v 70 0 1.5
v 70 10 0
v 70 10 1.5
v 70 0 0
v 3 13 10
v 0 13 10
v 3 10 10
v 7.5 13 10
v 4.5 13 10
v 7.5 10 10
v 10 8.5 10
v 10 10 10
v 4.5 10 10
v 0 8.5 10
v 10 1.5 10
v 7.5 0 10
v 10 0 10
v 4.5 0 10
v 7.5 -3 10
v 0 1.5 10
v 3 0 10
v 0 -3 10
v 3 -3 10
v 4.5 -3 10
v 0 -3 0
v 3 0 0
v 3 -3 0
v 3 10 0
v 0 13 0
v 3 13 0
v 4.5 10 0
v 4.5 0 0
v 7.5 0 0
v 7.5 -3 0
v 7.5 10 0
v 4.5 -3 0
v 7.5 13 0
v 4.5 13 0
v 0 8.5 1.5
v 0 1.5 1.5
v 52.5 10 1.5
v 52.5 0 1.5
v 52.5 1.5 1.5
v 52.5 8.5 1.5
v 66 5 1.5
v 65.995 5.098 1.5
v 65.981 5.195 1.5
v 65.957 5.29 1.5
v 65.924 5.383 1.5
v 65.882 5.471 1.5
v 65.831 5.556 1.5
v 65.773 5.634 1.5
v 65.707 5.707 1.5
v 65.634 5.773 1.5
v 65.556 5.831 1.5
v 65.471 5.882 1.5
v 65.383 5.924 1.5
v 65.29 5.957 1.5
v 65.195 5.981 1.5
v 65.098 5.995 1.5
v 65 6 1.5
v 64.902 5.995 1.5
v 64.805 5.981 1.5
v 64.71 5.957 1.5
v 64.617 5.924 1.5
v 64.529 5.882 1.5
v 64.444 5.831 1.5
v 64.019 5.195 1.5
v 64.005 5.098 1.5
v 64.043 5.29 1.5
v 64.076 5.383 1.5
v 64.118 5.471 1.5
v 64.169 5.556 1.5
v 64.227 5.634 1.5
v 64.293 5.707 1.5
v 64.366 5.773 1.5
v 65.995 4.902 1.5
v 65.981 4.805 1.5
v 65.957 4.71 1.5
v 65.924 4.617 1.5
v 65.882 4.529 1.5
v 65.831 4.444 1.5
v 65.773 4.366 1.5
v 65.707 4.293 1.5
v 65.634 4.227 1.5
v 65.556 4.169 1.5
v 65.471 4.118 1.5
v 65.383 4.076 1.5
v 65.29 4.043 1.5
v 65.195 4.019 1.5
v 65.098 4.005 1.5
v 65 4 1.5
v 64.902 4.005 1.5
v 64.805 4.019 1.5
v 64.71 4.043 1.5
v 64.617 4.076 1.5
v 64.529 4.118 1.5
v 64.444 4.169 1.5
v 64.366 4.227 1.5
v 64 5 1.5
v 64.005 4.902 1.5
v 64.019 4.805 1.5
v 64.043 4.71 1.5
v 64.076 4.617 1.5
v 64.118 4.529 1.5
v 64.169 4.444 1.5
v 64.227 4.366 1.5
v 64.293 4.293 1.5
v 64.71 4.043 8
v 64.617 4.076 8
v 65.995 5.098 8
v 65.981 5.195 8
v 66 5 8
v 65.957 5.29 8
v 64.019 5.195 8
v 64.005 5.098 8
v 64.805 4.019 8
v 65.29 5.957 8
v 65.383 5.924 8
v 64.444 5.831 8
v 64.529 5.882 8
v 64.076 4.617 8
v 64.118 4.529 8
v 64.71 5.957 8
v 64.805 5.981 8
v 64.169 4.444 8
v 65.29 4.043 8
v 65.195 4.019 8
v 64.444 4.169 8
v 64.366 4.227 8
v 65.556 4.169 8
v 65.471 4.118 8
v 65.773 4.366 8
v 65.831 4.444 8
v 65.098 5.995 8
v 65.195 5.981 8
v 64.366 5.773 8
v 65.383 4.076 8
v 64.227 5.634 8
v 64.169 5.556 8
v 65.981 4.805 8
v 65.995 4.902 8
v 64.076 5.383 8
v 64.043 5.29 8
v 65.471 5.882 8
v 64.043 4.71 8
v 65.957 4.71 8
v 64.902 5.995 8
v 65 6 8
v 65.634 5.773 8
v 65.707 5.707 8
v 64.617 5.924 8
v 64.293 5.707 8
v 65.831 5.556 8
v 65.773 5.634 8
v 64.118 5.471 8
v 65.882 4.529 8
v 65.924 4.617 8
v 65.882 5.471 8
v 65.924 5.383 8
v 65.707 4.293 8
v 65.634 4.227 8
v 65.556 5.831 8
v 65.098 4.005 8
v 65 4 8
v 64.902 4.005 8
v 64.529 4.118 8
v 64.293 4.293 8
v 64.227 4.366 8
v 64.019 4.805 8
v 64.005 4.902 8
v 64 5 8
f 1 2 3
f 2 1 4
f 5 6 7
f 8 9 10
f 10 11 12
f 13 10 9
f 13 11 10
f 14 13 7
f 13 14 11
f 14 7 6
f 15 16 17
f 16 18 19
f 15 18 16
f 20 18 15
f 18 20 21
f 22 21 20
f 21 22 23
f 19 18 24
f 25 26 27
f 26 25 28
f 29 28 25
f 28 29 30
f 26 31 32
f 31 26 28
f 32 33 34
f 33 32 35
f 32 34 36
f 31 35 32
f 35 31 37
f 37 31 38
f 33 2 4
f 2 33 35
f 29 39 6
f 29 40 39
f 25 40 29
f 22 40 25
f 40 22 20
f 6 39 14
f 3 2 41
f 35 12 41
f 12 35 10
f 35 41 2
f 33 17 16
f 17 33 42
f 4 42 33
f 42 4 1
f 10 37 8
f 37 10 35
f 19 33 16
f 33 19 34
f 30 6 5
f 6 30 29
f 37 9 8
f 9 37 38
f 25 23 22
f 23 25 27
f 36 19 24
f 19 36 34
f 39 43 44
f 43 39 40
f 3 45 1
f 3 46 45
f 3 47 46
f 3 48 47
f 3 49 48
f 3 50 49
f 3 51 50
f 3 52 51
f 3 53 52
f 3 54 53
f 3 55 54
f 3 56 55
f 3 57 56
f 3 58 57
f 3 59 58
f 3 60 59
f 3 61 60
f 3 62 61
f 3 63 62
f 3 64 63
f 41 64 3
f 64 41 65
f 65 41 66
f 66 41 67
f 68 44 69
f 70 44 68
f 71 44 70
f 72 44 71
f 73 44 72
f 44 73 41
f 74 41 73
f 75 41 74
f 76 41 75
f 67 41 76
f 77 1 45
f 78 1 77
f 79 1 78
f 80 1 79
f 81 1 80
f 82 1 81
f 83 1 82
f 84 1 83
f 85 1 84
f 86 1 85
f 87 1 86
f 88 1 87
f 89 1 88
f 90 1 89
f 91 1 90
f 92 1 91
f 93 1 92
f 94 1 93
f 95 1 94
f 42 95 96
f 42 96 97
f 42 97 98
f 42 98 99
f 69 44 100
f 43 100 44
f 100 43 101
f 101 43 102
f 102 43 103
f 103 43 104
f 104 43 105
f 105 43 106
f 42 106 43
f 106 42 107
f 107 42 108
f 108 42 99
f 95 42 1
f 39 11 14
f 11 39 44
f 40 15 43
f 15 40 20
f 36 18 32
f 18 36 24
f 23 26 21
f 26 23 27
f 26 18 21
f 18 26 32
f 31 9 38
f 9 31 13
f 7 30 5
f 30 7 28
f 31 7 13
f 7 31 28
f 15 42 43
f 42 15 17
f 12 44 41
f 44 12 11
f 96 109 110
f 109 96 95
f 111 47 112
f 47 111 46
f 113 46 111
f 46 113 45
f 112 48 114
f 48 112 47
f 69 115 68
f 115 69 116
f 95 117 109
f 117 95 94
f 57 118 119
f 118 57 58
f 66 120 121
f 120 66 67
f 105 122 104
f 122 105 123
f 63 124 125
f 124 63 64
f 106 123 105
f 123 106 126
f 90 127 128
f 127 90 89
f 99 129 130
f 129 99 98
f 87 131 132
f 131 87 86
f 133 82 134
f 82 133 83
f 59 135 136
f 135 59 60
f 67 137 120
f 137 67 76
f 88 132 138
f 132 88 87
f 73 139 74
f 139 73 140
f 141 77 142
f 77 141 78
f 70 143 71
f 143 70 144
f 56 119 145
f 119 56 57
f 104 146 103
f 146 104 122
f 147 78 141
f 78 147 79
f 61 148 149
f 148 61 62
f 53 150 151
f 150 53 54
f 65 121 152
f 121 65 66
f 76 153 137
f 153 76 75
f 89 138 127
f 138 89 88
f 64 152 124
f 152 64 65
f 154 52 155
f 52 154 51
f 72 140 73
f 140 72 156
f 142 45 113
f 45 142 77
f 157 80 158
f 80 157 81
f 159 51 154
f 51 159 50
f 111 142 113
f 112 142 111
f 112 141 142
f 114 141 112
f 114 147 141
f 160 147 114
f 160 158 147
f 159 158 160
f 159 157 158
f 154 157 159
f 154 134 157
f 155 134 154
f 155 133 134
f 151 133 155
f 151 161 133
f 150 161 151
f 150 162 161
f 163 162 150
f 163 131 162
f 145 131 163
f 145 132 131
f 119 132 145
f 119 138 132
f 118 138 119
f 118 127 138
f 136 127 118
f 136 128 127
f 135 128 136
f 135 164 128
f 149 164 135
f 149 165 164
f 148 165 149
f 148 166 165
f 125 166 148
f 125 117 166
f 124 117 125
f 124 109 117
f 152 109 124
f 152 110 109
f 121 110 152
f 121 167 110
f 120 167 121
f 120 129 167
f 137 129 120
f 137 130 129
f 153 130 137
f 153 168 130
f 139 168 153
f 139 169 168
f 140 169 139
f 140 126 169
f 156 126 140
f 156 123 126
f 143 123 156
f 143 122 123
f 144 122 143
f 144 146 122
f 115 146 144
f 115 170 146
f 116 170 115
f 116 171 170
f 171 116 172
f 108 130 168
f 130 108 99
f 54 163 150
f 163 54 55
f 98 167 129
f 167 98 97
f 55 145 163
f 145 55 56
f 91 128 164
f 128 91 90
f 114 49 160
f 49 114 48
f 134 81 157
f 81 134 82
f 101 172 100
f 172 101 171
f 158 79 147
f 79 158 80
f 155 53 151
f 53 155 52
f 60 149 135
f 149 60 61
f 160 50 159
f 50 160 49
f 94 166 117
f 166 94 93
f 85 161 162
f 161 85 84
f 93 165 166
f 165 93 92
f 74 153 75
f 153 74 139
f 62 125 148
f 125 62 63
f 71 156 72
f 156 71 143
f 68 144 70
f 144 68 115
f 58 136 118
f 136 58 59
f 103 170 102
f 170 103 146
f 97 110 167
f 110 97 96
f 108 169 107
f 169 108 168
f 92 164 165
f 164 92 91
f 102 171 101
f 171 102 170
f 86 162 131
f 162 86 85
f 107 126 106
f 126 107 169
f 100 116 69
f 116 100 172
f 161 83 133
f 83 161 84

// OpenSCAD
//tloustka plastu
t = 1.5;
//presah uchyceni
p = 3;

delka = 70;
sirka = 10;

//čep
vyska_cepu = 8;
prumer_cepu = 2;

$fn = 64;


difference() {
    union(){
        cube([delka,sirka,sirka]);
        translate([0,-p,0])
        cube([7.5,sirka+2*p,10]);
    }
    union() {
        translate([0,t,t])
        cube([delka,sirka-2*t,sirka]);
        
        translate([3,-p,0])
        cube([1.5,p,sirka]);
        
        translate([3,sirka,0])
        cube([1.5,p,sirka]);
        
        translate([0,sirka,0])
        rotate([90,0,0])
        linear_extrude(sirka)
        polygon([[sirka,sirka], [delka*3/4,sirka], [delka*3/4,t]]);
        
        translate([delka*3/4,0,t])
        cube([delka/4,sirka,sirka]);
    }
}

translate([delka-sirka/2,sirka/2,0])
cylinder(h=vyska_cepu,d=prumer_cepu);
